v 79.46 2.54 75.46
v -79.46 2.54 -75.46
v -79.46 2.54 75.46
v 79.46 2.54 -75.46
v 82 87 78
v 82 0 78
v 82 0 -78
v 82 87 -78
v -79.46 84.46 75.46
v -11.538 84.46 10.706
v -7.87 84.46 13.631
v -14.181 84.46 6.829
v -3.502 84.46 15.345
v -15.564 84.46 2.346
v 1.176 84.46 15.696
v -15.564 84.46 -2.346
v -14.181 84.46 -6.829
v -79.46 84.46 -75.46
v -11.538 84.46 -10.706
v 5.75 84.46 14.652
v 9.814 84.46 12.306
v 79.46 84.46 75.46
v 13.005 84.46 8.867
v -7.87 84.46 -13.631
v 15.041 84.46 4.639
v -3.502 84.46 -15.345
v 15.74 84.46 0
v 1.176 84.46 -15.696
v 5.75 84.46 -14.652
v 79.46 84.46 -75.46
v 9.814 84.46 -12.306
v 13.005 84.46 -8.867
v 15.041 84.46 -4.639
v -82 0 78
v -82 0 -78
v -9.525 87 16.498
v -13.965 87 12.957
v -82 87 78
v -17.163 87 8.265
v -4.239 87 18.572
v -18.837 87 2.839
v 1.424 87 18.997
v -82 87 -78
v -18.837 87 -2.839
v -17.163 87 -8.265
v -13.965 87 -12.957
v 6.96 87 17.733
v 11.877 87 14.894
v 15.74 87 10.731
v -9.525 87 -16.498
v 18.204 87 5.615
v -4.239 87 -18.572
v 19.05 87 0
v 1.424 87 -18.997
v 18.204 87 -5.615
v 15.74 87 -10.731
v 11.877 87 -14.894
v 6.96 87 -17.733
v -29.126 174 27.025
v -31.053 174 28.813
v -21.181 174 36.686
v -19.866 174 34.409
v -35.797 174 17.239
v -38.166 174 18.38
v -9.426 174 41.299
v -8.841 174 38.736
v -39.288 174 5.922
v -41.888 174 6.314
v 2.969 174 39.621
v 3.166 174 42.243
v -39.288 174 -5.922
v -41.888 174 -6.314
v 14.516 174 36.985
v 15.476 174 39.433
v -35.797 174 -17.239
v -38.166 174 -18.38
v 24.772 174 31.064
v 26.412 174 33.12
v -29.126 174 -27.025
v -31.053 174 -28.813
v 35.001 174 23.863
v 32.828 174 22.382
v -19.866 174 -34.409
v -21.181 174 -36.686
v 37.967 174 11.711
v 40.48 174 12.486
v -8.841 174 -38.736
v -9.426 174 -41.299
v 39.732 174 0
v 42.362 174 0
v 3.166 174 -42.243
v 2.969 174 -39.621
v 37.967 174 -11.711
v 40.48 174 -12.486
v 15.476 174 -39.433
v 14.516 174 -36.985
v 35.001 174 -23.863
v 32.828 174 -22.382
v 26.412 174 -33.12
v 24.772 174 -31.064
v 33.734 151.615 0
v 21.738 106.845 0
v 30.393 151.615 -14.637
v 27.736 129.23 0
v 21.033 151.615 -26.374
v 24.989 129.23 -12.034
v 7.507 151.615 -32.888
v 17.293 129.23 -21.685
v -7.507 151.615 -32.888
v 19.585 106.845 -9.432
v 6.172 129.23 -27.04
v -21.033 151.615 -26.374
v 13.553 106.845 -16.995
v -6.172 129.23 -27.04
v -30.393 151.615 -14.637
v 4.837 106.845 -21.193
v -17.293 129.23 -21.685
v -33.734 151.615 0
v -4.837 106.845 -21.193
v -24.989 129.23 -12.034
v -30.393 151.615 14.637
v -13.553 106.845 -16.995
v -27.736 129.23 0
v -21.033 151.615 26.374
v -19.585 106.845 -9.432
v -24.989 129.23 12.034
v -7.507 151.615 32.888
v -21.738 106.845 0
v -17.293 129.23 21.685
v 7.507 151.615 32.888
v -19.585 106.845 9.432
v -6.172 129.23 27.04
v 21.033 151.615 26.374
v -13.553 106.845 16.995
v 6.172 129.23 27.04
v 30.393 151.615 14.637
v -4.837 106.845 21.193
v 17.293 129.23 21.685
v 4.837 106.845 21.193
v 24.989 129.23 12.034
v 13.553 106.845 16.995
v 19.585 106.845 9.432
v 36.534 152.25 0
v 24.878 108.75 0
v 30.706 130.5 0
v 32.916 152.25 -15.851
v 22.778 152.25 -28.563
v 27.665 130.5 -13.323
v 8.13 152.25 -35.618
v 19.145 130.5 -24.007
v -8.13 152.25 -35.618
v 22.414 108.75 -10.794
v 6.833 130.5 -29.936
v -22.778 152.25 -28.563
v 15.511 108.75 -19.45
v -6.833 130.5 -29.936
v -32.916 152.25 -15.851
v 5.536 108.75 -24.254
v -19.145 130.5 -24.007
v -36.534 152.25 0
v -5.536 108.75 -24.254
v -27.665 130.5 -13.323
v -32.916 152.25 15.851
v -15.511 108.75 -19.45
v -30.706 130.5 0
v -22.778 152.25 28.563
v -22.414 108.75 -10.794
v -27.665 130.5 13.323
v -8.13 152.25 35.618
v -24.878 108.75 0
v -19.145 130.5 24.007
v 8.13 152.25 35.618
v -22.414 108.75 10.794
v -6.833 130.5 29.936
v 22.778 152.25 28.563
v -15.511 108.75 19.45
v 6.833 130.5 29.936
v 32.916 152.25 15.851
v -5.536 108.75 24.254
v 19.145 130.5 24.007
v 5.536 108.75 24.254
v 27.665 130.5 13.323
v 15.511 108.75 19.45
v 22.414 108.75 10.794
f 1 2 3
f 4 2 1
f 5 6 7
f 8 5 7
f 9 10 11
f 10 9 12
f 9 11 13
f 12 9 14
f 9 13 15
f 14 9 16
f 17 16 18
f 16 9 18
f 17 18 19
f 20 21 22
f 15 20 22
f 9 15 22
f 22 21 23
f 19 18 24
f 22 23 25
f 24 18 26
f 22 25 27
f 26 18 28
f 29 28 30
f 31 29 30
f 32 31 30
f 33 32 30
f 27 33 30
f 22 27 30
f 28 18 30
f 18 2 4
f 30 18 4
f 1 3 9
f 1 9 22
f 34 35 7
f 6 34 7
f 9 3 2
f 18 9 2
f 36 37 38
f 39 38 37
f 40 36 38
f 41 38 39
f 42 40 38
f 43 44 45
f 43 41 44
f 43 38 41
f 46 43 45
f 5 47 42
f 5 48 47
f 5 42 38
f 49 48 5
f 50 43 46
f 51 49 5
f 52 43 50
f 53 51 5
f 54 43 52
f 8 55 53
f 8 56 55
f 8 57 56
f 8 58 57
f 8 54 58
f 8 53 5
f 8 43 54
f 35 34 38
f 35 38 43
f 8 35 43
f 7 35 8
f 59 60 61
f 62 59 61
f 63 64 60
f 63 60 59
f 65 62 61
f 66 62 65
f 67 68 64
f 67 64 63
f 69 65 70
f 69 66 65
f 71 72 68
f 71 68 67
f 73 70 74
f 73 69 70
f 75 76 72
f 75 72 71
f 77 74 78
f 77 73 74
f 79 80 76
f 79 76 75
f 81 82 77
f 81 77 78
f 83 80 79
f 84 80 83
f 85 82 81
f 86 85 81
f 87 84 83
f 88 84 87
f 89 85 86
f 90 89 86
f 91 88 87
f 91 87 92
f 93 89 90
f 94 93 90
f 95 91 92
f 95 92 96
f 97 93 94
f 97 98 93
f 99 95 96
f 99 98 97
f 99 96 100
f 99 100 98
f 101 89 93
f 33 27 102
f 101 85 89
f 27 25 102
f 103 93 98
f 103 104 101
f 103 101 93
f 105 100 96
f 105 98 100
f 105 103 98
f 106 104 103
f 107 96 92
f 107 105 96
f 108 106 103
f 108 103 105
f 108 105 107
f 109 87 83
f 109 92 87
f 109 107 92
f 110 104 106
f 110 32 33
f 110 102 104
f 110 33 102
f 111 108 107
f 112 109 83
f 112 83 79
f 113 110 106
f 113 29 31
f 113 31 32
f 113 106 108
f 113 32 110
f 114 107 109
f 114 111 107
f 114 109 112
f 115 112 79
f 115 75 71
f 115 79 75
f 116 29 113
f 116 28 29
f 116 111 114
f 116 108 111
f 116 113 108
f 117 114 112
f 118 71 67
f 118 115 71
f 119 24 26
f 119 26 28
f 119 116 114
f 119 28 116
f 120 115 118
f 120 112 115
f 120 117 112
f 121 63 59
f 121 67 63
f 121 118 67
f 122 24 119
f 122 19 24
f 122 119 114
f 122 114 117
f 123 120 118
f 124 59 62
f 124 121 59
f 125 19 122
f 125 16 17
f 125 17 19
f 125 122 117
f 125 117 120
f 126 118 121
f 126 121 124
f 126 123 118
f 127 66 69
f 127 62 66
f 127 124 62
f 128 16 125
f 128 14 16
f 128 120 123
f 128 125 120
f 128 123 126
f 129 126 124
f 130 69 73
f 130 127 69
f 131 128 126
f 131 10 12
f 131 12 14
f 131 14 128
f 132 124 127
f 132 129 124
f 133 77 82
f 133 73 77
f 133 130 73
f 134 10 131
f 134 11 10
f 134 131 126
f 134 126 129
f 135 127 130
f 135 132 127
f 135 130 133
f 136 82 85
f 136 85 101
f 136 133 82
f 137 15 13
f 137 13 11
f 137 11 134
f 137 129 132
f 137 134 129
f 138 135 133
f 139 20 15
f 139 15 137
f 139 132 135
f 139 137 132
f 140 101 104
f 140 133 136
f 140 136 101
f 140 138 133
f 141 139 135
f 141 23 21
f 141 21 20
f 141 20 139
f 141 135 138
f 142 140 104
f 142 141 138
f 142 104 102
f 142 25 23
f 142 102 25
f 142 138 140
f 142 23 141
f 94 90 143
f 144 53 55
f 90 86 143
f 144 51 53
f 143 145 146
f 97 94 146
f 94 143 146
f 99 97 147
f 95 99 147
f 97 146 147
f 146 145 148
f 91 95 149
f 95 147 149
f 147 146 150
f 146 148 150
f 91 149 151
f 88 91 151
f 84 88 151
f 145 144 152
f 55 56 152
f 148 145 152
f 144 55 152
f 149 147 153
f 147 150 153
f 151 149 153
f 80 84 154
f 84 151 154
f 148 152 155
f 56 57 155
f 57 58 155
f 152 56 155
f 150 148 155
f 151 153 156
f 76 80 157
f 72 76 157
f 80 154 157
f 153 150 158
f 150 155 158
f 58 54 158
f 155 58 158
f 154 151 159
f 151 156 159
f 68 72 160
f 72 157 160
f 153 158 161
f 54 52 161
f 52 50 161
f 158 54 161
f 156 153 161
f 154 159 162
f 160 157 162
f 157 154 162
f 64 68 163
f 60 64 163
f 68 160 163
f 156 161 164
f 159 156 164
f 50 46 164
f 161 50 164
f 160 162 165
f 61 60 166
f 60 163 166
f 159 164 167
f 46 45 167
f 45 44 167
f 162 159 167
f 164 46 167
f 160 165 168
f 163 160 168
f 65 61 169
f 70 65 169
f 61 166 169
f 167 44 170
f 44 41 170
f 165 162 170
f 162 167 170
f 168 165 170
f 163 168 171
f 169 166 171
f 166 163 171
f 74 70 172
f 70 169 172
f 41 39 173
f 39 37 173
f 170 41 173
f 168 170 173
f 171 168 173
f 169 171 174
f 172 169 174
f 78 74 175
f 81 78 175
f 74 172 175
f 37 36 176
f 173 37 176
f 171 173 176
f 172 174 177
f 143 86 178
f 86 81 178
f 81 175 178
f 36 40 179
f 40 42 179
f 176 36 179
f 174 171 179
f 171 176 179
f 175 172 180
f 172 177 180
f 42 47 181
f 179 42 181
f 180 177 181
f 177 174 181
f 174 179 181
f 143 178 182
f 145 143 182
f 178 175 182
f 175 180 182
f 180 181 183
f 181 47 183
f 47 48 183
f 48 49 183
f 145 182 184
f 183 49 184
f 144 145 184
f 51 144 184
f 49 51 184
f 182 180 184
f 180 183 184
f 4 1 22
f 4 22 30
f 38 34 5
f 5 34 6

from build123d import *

# Parameters (mm, degrees)
SKETCH1_W           = 164
SKETCH1_H           = 156
BOSS_EXTRUDE2_DEPTH = 87
SKETCH2_R           = 19.05
BOSS_EXTRUDE3_DEPTH = 87
BOSS_EXTRUDE3_DRAFT = -15
SHELL1_T            = -2.54


with BuildPart() as part:
    # Sketch1 → Boss-Extrude2 (new body)
    with BuildSketch(Plane(origin=(0, 0, 0), x_dir=(1, 0, 0), z_dir=(0, 1, 0))):
        Rectangle(SKETCH1_W, SKETCH1_H)
    extrude(amount=BOSS_EXTRUDE2_DEPTH)


with BuildPart() as boss_extrude3_tool:
    # Sketch2 → Boss-Extrude3 (with draft: the straight prism first)
    with BuildSketch(Plane(origin=(0, 87, 0), x_dir=(1, 0, 0), z_dir=(0, 1, 0))):
        Circle(SKETCH2_R)
    extrude(amount=BOSS_EXTRUDE3_DEPTH)
    # Boss-Extrude3: the draft: its side faces are tilted about the plane it starts from
    boss_extrude3_sides = [boss_extrude3_tool.faces().sort_by_distance(p)[0] for p in [
        (-19.05, 130.5, 0),
    ]]
    draft(boss_extrude3_sides, Plane(origin=(0, 87, 0), x_dir=(1, 0, 0), z_dir=(0, 1, 0)), BOSS_EXTRUDE3_DRAFT)


with BuildPart() as part_1:
    add(part.part)

    # Boss-Extrude3: add boss_extrude3_tool
    add(boss_extrude3_tool.part)

    # Shell1
    shell1_openings = [part_1.faces().sort_by_distance(p)[0] for p in [
        (0, 174, 0),
    ]]
    offset(amount=SHELL1_T, openings=shell1_openings, kind=Kind.INTERSECTION)


solid = part_1.part
